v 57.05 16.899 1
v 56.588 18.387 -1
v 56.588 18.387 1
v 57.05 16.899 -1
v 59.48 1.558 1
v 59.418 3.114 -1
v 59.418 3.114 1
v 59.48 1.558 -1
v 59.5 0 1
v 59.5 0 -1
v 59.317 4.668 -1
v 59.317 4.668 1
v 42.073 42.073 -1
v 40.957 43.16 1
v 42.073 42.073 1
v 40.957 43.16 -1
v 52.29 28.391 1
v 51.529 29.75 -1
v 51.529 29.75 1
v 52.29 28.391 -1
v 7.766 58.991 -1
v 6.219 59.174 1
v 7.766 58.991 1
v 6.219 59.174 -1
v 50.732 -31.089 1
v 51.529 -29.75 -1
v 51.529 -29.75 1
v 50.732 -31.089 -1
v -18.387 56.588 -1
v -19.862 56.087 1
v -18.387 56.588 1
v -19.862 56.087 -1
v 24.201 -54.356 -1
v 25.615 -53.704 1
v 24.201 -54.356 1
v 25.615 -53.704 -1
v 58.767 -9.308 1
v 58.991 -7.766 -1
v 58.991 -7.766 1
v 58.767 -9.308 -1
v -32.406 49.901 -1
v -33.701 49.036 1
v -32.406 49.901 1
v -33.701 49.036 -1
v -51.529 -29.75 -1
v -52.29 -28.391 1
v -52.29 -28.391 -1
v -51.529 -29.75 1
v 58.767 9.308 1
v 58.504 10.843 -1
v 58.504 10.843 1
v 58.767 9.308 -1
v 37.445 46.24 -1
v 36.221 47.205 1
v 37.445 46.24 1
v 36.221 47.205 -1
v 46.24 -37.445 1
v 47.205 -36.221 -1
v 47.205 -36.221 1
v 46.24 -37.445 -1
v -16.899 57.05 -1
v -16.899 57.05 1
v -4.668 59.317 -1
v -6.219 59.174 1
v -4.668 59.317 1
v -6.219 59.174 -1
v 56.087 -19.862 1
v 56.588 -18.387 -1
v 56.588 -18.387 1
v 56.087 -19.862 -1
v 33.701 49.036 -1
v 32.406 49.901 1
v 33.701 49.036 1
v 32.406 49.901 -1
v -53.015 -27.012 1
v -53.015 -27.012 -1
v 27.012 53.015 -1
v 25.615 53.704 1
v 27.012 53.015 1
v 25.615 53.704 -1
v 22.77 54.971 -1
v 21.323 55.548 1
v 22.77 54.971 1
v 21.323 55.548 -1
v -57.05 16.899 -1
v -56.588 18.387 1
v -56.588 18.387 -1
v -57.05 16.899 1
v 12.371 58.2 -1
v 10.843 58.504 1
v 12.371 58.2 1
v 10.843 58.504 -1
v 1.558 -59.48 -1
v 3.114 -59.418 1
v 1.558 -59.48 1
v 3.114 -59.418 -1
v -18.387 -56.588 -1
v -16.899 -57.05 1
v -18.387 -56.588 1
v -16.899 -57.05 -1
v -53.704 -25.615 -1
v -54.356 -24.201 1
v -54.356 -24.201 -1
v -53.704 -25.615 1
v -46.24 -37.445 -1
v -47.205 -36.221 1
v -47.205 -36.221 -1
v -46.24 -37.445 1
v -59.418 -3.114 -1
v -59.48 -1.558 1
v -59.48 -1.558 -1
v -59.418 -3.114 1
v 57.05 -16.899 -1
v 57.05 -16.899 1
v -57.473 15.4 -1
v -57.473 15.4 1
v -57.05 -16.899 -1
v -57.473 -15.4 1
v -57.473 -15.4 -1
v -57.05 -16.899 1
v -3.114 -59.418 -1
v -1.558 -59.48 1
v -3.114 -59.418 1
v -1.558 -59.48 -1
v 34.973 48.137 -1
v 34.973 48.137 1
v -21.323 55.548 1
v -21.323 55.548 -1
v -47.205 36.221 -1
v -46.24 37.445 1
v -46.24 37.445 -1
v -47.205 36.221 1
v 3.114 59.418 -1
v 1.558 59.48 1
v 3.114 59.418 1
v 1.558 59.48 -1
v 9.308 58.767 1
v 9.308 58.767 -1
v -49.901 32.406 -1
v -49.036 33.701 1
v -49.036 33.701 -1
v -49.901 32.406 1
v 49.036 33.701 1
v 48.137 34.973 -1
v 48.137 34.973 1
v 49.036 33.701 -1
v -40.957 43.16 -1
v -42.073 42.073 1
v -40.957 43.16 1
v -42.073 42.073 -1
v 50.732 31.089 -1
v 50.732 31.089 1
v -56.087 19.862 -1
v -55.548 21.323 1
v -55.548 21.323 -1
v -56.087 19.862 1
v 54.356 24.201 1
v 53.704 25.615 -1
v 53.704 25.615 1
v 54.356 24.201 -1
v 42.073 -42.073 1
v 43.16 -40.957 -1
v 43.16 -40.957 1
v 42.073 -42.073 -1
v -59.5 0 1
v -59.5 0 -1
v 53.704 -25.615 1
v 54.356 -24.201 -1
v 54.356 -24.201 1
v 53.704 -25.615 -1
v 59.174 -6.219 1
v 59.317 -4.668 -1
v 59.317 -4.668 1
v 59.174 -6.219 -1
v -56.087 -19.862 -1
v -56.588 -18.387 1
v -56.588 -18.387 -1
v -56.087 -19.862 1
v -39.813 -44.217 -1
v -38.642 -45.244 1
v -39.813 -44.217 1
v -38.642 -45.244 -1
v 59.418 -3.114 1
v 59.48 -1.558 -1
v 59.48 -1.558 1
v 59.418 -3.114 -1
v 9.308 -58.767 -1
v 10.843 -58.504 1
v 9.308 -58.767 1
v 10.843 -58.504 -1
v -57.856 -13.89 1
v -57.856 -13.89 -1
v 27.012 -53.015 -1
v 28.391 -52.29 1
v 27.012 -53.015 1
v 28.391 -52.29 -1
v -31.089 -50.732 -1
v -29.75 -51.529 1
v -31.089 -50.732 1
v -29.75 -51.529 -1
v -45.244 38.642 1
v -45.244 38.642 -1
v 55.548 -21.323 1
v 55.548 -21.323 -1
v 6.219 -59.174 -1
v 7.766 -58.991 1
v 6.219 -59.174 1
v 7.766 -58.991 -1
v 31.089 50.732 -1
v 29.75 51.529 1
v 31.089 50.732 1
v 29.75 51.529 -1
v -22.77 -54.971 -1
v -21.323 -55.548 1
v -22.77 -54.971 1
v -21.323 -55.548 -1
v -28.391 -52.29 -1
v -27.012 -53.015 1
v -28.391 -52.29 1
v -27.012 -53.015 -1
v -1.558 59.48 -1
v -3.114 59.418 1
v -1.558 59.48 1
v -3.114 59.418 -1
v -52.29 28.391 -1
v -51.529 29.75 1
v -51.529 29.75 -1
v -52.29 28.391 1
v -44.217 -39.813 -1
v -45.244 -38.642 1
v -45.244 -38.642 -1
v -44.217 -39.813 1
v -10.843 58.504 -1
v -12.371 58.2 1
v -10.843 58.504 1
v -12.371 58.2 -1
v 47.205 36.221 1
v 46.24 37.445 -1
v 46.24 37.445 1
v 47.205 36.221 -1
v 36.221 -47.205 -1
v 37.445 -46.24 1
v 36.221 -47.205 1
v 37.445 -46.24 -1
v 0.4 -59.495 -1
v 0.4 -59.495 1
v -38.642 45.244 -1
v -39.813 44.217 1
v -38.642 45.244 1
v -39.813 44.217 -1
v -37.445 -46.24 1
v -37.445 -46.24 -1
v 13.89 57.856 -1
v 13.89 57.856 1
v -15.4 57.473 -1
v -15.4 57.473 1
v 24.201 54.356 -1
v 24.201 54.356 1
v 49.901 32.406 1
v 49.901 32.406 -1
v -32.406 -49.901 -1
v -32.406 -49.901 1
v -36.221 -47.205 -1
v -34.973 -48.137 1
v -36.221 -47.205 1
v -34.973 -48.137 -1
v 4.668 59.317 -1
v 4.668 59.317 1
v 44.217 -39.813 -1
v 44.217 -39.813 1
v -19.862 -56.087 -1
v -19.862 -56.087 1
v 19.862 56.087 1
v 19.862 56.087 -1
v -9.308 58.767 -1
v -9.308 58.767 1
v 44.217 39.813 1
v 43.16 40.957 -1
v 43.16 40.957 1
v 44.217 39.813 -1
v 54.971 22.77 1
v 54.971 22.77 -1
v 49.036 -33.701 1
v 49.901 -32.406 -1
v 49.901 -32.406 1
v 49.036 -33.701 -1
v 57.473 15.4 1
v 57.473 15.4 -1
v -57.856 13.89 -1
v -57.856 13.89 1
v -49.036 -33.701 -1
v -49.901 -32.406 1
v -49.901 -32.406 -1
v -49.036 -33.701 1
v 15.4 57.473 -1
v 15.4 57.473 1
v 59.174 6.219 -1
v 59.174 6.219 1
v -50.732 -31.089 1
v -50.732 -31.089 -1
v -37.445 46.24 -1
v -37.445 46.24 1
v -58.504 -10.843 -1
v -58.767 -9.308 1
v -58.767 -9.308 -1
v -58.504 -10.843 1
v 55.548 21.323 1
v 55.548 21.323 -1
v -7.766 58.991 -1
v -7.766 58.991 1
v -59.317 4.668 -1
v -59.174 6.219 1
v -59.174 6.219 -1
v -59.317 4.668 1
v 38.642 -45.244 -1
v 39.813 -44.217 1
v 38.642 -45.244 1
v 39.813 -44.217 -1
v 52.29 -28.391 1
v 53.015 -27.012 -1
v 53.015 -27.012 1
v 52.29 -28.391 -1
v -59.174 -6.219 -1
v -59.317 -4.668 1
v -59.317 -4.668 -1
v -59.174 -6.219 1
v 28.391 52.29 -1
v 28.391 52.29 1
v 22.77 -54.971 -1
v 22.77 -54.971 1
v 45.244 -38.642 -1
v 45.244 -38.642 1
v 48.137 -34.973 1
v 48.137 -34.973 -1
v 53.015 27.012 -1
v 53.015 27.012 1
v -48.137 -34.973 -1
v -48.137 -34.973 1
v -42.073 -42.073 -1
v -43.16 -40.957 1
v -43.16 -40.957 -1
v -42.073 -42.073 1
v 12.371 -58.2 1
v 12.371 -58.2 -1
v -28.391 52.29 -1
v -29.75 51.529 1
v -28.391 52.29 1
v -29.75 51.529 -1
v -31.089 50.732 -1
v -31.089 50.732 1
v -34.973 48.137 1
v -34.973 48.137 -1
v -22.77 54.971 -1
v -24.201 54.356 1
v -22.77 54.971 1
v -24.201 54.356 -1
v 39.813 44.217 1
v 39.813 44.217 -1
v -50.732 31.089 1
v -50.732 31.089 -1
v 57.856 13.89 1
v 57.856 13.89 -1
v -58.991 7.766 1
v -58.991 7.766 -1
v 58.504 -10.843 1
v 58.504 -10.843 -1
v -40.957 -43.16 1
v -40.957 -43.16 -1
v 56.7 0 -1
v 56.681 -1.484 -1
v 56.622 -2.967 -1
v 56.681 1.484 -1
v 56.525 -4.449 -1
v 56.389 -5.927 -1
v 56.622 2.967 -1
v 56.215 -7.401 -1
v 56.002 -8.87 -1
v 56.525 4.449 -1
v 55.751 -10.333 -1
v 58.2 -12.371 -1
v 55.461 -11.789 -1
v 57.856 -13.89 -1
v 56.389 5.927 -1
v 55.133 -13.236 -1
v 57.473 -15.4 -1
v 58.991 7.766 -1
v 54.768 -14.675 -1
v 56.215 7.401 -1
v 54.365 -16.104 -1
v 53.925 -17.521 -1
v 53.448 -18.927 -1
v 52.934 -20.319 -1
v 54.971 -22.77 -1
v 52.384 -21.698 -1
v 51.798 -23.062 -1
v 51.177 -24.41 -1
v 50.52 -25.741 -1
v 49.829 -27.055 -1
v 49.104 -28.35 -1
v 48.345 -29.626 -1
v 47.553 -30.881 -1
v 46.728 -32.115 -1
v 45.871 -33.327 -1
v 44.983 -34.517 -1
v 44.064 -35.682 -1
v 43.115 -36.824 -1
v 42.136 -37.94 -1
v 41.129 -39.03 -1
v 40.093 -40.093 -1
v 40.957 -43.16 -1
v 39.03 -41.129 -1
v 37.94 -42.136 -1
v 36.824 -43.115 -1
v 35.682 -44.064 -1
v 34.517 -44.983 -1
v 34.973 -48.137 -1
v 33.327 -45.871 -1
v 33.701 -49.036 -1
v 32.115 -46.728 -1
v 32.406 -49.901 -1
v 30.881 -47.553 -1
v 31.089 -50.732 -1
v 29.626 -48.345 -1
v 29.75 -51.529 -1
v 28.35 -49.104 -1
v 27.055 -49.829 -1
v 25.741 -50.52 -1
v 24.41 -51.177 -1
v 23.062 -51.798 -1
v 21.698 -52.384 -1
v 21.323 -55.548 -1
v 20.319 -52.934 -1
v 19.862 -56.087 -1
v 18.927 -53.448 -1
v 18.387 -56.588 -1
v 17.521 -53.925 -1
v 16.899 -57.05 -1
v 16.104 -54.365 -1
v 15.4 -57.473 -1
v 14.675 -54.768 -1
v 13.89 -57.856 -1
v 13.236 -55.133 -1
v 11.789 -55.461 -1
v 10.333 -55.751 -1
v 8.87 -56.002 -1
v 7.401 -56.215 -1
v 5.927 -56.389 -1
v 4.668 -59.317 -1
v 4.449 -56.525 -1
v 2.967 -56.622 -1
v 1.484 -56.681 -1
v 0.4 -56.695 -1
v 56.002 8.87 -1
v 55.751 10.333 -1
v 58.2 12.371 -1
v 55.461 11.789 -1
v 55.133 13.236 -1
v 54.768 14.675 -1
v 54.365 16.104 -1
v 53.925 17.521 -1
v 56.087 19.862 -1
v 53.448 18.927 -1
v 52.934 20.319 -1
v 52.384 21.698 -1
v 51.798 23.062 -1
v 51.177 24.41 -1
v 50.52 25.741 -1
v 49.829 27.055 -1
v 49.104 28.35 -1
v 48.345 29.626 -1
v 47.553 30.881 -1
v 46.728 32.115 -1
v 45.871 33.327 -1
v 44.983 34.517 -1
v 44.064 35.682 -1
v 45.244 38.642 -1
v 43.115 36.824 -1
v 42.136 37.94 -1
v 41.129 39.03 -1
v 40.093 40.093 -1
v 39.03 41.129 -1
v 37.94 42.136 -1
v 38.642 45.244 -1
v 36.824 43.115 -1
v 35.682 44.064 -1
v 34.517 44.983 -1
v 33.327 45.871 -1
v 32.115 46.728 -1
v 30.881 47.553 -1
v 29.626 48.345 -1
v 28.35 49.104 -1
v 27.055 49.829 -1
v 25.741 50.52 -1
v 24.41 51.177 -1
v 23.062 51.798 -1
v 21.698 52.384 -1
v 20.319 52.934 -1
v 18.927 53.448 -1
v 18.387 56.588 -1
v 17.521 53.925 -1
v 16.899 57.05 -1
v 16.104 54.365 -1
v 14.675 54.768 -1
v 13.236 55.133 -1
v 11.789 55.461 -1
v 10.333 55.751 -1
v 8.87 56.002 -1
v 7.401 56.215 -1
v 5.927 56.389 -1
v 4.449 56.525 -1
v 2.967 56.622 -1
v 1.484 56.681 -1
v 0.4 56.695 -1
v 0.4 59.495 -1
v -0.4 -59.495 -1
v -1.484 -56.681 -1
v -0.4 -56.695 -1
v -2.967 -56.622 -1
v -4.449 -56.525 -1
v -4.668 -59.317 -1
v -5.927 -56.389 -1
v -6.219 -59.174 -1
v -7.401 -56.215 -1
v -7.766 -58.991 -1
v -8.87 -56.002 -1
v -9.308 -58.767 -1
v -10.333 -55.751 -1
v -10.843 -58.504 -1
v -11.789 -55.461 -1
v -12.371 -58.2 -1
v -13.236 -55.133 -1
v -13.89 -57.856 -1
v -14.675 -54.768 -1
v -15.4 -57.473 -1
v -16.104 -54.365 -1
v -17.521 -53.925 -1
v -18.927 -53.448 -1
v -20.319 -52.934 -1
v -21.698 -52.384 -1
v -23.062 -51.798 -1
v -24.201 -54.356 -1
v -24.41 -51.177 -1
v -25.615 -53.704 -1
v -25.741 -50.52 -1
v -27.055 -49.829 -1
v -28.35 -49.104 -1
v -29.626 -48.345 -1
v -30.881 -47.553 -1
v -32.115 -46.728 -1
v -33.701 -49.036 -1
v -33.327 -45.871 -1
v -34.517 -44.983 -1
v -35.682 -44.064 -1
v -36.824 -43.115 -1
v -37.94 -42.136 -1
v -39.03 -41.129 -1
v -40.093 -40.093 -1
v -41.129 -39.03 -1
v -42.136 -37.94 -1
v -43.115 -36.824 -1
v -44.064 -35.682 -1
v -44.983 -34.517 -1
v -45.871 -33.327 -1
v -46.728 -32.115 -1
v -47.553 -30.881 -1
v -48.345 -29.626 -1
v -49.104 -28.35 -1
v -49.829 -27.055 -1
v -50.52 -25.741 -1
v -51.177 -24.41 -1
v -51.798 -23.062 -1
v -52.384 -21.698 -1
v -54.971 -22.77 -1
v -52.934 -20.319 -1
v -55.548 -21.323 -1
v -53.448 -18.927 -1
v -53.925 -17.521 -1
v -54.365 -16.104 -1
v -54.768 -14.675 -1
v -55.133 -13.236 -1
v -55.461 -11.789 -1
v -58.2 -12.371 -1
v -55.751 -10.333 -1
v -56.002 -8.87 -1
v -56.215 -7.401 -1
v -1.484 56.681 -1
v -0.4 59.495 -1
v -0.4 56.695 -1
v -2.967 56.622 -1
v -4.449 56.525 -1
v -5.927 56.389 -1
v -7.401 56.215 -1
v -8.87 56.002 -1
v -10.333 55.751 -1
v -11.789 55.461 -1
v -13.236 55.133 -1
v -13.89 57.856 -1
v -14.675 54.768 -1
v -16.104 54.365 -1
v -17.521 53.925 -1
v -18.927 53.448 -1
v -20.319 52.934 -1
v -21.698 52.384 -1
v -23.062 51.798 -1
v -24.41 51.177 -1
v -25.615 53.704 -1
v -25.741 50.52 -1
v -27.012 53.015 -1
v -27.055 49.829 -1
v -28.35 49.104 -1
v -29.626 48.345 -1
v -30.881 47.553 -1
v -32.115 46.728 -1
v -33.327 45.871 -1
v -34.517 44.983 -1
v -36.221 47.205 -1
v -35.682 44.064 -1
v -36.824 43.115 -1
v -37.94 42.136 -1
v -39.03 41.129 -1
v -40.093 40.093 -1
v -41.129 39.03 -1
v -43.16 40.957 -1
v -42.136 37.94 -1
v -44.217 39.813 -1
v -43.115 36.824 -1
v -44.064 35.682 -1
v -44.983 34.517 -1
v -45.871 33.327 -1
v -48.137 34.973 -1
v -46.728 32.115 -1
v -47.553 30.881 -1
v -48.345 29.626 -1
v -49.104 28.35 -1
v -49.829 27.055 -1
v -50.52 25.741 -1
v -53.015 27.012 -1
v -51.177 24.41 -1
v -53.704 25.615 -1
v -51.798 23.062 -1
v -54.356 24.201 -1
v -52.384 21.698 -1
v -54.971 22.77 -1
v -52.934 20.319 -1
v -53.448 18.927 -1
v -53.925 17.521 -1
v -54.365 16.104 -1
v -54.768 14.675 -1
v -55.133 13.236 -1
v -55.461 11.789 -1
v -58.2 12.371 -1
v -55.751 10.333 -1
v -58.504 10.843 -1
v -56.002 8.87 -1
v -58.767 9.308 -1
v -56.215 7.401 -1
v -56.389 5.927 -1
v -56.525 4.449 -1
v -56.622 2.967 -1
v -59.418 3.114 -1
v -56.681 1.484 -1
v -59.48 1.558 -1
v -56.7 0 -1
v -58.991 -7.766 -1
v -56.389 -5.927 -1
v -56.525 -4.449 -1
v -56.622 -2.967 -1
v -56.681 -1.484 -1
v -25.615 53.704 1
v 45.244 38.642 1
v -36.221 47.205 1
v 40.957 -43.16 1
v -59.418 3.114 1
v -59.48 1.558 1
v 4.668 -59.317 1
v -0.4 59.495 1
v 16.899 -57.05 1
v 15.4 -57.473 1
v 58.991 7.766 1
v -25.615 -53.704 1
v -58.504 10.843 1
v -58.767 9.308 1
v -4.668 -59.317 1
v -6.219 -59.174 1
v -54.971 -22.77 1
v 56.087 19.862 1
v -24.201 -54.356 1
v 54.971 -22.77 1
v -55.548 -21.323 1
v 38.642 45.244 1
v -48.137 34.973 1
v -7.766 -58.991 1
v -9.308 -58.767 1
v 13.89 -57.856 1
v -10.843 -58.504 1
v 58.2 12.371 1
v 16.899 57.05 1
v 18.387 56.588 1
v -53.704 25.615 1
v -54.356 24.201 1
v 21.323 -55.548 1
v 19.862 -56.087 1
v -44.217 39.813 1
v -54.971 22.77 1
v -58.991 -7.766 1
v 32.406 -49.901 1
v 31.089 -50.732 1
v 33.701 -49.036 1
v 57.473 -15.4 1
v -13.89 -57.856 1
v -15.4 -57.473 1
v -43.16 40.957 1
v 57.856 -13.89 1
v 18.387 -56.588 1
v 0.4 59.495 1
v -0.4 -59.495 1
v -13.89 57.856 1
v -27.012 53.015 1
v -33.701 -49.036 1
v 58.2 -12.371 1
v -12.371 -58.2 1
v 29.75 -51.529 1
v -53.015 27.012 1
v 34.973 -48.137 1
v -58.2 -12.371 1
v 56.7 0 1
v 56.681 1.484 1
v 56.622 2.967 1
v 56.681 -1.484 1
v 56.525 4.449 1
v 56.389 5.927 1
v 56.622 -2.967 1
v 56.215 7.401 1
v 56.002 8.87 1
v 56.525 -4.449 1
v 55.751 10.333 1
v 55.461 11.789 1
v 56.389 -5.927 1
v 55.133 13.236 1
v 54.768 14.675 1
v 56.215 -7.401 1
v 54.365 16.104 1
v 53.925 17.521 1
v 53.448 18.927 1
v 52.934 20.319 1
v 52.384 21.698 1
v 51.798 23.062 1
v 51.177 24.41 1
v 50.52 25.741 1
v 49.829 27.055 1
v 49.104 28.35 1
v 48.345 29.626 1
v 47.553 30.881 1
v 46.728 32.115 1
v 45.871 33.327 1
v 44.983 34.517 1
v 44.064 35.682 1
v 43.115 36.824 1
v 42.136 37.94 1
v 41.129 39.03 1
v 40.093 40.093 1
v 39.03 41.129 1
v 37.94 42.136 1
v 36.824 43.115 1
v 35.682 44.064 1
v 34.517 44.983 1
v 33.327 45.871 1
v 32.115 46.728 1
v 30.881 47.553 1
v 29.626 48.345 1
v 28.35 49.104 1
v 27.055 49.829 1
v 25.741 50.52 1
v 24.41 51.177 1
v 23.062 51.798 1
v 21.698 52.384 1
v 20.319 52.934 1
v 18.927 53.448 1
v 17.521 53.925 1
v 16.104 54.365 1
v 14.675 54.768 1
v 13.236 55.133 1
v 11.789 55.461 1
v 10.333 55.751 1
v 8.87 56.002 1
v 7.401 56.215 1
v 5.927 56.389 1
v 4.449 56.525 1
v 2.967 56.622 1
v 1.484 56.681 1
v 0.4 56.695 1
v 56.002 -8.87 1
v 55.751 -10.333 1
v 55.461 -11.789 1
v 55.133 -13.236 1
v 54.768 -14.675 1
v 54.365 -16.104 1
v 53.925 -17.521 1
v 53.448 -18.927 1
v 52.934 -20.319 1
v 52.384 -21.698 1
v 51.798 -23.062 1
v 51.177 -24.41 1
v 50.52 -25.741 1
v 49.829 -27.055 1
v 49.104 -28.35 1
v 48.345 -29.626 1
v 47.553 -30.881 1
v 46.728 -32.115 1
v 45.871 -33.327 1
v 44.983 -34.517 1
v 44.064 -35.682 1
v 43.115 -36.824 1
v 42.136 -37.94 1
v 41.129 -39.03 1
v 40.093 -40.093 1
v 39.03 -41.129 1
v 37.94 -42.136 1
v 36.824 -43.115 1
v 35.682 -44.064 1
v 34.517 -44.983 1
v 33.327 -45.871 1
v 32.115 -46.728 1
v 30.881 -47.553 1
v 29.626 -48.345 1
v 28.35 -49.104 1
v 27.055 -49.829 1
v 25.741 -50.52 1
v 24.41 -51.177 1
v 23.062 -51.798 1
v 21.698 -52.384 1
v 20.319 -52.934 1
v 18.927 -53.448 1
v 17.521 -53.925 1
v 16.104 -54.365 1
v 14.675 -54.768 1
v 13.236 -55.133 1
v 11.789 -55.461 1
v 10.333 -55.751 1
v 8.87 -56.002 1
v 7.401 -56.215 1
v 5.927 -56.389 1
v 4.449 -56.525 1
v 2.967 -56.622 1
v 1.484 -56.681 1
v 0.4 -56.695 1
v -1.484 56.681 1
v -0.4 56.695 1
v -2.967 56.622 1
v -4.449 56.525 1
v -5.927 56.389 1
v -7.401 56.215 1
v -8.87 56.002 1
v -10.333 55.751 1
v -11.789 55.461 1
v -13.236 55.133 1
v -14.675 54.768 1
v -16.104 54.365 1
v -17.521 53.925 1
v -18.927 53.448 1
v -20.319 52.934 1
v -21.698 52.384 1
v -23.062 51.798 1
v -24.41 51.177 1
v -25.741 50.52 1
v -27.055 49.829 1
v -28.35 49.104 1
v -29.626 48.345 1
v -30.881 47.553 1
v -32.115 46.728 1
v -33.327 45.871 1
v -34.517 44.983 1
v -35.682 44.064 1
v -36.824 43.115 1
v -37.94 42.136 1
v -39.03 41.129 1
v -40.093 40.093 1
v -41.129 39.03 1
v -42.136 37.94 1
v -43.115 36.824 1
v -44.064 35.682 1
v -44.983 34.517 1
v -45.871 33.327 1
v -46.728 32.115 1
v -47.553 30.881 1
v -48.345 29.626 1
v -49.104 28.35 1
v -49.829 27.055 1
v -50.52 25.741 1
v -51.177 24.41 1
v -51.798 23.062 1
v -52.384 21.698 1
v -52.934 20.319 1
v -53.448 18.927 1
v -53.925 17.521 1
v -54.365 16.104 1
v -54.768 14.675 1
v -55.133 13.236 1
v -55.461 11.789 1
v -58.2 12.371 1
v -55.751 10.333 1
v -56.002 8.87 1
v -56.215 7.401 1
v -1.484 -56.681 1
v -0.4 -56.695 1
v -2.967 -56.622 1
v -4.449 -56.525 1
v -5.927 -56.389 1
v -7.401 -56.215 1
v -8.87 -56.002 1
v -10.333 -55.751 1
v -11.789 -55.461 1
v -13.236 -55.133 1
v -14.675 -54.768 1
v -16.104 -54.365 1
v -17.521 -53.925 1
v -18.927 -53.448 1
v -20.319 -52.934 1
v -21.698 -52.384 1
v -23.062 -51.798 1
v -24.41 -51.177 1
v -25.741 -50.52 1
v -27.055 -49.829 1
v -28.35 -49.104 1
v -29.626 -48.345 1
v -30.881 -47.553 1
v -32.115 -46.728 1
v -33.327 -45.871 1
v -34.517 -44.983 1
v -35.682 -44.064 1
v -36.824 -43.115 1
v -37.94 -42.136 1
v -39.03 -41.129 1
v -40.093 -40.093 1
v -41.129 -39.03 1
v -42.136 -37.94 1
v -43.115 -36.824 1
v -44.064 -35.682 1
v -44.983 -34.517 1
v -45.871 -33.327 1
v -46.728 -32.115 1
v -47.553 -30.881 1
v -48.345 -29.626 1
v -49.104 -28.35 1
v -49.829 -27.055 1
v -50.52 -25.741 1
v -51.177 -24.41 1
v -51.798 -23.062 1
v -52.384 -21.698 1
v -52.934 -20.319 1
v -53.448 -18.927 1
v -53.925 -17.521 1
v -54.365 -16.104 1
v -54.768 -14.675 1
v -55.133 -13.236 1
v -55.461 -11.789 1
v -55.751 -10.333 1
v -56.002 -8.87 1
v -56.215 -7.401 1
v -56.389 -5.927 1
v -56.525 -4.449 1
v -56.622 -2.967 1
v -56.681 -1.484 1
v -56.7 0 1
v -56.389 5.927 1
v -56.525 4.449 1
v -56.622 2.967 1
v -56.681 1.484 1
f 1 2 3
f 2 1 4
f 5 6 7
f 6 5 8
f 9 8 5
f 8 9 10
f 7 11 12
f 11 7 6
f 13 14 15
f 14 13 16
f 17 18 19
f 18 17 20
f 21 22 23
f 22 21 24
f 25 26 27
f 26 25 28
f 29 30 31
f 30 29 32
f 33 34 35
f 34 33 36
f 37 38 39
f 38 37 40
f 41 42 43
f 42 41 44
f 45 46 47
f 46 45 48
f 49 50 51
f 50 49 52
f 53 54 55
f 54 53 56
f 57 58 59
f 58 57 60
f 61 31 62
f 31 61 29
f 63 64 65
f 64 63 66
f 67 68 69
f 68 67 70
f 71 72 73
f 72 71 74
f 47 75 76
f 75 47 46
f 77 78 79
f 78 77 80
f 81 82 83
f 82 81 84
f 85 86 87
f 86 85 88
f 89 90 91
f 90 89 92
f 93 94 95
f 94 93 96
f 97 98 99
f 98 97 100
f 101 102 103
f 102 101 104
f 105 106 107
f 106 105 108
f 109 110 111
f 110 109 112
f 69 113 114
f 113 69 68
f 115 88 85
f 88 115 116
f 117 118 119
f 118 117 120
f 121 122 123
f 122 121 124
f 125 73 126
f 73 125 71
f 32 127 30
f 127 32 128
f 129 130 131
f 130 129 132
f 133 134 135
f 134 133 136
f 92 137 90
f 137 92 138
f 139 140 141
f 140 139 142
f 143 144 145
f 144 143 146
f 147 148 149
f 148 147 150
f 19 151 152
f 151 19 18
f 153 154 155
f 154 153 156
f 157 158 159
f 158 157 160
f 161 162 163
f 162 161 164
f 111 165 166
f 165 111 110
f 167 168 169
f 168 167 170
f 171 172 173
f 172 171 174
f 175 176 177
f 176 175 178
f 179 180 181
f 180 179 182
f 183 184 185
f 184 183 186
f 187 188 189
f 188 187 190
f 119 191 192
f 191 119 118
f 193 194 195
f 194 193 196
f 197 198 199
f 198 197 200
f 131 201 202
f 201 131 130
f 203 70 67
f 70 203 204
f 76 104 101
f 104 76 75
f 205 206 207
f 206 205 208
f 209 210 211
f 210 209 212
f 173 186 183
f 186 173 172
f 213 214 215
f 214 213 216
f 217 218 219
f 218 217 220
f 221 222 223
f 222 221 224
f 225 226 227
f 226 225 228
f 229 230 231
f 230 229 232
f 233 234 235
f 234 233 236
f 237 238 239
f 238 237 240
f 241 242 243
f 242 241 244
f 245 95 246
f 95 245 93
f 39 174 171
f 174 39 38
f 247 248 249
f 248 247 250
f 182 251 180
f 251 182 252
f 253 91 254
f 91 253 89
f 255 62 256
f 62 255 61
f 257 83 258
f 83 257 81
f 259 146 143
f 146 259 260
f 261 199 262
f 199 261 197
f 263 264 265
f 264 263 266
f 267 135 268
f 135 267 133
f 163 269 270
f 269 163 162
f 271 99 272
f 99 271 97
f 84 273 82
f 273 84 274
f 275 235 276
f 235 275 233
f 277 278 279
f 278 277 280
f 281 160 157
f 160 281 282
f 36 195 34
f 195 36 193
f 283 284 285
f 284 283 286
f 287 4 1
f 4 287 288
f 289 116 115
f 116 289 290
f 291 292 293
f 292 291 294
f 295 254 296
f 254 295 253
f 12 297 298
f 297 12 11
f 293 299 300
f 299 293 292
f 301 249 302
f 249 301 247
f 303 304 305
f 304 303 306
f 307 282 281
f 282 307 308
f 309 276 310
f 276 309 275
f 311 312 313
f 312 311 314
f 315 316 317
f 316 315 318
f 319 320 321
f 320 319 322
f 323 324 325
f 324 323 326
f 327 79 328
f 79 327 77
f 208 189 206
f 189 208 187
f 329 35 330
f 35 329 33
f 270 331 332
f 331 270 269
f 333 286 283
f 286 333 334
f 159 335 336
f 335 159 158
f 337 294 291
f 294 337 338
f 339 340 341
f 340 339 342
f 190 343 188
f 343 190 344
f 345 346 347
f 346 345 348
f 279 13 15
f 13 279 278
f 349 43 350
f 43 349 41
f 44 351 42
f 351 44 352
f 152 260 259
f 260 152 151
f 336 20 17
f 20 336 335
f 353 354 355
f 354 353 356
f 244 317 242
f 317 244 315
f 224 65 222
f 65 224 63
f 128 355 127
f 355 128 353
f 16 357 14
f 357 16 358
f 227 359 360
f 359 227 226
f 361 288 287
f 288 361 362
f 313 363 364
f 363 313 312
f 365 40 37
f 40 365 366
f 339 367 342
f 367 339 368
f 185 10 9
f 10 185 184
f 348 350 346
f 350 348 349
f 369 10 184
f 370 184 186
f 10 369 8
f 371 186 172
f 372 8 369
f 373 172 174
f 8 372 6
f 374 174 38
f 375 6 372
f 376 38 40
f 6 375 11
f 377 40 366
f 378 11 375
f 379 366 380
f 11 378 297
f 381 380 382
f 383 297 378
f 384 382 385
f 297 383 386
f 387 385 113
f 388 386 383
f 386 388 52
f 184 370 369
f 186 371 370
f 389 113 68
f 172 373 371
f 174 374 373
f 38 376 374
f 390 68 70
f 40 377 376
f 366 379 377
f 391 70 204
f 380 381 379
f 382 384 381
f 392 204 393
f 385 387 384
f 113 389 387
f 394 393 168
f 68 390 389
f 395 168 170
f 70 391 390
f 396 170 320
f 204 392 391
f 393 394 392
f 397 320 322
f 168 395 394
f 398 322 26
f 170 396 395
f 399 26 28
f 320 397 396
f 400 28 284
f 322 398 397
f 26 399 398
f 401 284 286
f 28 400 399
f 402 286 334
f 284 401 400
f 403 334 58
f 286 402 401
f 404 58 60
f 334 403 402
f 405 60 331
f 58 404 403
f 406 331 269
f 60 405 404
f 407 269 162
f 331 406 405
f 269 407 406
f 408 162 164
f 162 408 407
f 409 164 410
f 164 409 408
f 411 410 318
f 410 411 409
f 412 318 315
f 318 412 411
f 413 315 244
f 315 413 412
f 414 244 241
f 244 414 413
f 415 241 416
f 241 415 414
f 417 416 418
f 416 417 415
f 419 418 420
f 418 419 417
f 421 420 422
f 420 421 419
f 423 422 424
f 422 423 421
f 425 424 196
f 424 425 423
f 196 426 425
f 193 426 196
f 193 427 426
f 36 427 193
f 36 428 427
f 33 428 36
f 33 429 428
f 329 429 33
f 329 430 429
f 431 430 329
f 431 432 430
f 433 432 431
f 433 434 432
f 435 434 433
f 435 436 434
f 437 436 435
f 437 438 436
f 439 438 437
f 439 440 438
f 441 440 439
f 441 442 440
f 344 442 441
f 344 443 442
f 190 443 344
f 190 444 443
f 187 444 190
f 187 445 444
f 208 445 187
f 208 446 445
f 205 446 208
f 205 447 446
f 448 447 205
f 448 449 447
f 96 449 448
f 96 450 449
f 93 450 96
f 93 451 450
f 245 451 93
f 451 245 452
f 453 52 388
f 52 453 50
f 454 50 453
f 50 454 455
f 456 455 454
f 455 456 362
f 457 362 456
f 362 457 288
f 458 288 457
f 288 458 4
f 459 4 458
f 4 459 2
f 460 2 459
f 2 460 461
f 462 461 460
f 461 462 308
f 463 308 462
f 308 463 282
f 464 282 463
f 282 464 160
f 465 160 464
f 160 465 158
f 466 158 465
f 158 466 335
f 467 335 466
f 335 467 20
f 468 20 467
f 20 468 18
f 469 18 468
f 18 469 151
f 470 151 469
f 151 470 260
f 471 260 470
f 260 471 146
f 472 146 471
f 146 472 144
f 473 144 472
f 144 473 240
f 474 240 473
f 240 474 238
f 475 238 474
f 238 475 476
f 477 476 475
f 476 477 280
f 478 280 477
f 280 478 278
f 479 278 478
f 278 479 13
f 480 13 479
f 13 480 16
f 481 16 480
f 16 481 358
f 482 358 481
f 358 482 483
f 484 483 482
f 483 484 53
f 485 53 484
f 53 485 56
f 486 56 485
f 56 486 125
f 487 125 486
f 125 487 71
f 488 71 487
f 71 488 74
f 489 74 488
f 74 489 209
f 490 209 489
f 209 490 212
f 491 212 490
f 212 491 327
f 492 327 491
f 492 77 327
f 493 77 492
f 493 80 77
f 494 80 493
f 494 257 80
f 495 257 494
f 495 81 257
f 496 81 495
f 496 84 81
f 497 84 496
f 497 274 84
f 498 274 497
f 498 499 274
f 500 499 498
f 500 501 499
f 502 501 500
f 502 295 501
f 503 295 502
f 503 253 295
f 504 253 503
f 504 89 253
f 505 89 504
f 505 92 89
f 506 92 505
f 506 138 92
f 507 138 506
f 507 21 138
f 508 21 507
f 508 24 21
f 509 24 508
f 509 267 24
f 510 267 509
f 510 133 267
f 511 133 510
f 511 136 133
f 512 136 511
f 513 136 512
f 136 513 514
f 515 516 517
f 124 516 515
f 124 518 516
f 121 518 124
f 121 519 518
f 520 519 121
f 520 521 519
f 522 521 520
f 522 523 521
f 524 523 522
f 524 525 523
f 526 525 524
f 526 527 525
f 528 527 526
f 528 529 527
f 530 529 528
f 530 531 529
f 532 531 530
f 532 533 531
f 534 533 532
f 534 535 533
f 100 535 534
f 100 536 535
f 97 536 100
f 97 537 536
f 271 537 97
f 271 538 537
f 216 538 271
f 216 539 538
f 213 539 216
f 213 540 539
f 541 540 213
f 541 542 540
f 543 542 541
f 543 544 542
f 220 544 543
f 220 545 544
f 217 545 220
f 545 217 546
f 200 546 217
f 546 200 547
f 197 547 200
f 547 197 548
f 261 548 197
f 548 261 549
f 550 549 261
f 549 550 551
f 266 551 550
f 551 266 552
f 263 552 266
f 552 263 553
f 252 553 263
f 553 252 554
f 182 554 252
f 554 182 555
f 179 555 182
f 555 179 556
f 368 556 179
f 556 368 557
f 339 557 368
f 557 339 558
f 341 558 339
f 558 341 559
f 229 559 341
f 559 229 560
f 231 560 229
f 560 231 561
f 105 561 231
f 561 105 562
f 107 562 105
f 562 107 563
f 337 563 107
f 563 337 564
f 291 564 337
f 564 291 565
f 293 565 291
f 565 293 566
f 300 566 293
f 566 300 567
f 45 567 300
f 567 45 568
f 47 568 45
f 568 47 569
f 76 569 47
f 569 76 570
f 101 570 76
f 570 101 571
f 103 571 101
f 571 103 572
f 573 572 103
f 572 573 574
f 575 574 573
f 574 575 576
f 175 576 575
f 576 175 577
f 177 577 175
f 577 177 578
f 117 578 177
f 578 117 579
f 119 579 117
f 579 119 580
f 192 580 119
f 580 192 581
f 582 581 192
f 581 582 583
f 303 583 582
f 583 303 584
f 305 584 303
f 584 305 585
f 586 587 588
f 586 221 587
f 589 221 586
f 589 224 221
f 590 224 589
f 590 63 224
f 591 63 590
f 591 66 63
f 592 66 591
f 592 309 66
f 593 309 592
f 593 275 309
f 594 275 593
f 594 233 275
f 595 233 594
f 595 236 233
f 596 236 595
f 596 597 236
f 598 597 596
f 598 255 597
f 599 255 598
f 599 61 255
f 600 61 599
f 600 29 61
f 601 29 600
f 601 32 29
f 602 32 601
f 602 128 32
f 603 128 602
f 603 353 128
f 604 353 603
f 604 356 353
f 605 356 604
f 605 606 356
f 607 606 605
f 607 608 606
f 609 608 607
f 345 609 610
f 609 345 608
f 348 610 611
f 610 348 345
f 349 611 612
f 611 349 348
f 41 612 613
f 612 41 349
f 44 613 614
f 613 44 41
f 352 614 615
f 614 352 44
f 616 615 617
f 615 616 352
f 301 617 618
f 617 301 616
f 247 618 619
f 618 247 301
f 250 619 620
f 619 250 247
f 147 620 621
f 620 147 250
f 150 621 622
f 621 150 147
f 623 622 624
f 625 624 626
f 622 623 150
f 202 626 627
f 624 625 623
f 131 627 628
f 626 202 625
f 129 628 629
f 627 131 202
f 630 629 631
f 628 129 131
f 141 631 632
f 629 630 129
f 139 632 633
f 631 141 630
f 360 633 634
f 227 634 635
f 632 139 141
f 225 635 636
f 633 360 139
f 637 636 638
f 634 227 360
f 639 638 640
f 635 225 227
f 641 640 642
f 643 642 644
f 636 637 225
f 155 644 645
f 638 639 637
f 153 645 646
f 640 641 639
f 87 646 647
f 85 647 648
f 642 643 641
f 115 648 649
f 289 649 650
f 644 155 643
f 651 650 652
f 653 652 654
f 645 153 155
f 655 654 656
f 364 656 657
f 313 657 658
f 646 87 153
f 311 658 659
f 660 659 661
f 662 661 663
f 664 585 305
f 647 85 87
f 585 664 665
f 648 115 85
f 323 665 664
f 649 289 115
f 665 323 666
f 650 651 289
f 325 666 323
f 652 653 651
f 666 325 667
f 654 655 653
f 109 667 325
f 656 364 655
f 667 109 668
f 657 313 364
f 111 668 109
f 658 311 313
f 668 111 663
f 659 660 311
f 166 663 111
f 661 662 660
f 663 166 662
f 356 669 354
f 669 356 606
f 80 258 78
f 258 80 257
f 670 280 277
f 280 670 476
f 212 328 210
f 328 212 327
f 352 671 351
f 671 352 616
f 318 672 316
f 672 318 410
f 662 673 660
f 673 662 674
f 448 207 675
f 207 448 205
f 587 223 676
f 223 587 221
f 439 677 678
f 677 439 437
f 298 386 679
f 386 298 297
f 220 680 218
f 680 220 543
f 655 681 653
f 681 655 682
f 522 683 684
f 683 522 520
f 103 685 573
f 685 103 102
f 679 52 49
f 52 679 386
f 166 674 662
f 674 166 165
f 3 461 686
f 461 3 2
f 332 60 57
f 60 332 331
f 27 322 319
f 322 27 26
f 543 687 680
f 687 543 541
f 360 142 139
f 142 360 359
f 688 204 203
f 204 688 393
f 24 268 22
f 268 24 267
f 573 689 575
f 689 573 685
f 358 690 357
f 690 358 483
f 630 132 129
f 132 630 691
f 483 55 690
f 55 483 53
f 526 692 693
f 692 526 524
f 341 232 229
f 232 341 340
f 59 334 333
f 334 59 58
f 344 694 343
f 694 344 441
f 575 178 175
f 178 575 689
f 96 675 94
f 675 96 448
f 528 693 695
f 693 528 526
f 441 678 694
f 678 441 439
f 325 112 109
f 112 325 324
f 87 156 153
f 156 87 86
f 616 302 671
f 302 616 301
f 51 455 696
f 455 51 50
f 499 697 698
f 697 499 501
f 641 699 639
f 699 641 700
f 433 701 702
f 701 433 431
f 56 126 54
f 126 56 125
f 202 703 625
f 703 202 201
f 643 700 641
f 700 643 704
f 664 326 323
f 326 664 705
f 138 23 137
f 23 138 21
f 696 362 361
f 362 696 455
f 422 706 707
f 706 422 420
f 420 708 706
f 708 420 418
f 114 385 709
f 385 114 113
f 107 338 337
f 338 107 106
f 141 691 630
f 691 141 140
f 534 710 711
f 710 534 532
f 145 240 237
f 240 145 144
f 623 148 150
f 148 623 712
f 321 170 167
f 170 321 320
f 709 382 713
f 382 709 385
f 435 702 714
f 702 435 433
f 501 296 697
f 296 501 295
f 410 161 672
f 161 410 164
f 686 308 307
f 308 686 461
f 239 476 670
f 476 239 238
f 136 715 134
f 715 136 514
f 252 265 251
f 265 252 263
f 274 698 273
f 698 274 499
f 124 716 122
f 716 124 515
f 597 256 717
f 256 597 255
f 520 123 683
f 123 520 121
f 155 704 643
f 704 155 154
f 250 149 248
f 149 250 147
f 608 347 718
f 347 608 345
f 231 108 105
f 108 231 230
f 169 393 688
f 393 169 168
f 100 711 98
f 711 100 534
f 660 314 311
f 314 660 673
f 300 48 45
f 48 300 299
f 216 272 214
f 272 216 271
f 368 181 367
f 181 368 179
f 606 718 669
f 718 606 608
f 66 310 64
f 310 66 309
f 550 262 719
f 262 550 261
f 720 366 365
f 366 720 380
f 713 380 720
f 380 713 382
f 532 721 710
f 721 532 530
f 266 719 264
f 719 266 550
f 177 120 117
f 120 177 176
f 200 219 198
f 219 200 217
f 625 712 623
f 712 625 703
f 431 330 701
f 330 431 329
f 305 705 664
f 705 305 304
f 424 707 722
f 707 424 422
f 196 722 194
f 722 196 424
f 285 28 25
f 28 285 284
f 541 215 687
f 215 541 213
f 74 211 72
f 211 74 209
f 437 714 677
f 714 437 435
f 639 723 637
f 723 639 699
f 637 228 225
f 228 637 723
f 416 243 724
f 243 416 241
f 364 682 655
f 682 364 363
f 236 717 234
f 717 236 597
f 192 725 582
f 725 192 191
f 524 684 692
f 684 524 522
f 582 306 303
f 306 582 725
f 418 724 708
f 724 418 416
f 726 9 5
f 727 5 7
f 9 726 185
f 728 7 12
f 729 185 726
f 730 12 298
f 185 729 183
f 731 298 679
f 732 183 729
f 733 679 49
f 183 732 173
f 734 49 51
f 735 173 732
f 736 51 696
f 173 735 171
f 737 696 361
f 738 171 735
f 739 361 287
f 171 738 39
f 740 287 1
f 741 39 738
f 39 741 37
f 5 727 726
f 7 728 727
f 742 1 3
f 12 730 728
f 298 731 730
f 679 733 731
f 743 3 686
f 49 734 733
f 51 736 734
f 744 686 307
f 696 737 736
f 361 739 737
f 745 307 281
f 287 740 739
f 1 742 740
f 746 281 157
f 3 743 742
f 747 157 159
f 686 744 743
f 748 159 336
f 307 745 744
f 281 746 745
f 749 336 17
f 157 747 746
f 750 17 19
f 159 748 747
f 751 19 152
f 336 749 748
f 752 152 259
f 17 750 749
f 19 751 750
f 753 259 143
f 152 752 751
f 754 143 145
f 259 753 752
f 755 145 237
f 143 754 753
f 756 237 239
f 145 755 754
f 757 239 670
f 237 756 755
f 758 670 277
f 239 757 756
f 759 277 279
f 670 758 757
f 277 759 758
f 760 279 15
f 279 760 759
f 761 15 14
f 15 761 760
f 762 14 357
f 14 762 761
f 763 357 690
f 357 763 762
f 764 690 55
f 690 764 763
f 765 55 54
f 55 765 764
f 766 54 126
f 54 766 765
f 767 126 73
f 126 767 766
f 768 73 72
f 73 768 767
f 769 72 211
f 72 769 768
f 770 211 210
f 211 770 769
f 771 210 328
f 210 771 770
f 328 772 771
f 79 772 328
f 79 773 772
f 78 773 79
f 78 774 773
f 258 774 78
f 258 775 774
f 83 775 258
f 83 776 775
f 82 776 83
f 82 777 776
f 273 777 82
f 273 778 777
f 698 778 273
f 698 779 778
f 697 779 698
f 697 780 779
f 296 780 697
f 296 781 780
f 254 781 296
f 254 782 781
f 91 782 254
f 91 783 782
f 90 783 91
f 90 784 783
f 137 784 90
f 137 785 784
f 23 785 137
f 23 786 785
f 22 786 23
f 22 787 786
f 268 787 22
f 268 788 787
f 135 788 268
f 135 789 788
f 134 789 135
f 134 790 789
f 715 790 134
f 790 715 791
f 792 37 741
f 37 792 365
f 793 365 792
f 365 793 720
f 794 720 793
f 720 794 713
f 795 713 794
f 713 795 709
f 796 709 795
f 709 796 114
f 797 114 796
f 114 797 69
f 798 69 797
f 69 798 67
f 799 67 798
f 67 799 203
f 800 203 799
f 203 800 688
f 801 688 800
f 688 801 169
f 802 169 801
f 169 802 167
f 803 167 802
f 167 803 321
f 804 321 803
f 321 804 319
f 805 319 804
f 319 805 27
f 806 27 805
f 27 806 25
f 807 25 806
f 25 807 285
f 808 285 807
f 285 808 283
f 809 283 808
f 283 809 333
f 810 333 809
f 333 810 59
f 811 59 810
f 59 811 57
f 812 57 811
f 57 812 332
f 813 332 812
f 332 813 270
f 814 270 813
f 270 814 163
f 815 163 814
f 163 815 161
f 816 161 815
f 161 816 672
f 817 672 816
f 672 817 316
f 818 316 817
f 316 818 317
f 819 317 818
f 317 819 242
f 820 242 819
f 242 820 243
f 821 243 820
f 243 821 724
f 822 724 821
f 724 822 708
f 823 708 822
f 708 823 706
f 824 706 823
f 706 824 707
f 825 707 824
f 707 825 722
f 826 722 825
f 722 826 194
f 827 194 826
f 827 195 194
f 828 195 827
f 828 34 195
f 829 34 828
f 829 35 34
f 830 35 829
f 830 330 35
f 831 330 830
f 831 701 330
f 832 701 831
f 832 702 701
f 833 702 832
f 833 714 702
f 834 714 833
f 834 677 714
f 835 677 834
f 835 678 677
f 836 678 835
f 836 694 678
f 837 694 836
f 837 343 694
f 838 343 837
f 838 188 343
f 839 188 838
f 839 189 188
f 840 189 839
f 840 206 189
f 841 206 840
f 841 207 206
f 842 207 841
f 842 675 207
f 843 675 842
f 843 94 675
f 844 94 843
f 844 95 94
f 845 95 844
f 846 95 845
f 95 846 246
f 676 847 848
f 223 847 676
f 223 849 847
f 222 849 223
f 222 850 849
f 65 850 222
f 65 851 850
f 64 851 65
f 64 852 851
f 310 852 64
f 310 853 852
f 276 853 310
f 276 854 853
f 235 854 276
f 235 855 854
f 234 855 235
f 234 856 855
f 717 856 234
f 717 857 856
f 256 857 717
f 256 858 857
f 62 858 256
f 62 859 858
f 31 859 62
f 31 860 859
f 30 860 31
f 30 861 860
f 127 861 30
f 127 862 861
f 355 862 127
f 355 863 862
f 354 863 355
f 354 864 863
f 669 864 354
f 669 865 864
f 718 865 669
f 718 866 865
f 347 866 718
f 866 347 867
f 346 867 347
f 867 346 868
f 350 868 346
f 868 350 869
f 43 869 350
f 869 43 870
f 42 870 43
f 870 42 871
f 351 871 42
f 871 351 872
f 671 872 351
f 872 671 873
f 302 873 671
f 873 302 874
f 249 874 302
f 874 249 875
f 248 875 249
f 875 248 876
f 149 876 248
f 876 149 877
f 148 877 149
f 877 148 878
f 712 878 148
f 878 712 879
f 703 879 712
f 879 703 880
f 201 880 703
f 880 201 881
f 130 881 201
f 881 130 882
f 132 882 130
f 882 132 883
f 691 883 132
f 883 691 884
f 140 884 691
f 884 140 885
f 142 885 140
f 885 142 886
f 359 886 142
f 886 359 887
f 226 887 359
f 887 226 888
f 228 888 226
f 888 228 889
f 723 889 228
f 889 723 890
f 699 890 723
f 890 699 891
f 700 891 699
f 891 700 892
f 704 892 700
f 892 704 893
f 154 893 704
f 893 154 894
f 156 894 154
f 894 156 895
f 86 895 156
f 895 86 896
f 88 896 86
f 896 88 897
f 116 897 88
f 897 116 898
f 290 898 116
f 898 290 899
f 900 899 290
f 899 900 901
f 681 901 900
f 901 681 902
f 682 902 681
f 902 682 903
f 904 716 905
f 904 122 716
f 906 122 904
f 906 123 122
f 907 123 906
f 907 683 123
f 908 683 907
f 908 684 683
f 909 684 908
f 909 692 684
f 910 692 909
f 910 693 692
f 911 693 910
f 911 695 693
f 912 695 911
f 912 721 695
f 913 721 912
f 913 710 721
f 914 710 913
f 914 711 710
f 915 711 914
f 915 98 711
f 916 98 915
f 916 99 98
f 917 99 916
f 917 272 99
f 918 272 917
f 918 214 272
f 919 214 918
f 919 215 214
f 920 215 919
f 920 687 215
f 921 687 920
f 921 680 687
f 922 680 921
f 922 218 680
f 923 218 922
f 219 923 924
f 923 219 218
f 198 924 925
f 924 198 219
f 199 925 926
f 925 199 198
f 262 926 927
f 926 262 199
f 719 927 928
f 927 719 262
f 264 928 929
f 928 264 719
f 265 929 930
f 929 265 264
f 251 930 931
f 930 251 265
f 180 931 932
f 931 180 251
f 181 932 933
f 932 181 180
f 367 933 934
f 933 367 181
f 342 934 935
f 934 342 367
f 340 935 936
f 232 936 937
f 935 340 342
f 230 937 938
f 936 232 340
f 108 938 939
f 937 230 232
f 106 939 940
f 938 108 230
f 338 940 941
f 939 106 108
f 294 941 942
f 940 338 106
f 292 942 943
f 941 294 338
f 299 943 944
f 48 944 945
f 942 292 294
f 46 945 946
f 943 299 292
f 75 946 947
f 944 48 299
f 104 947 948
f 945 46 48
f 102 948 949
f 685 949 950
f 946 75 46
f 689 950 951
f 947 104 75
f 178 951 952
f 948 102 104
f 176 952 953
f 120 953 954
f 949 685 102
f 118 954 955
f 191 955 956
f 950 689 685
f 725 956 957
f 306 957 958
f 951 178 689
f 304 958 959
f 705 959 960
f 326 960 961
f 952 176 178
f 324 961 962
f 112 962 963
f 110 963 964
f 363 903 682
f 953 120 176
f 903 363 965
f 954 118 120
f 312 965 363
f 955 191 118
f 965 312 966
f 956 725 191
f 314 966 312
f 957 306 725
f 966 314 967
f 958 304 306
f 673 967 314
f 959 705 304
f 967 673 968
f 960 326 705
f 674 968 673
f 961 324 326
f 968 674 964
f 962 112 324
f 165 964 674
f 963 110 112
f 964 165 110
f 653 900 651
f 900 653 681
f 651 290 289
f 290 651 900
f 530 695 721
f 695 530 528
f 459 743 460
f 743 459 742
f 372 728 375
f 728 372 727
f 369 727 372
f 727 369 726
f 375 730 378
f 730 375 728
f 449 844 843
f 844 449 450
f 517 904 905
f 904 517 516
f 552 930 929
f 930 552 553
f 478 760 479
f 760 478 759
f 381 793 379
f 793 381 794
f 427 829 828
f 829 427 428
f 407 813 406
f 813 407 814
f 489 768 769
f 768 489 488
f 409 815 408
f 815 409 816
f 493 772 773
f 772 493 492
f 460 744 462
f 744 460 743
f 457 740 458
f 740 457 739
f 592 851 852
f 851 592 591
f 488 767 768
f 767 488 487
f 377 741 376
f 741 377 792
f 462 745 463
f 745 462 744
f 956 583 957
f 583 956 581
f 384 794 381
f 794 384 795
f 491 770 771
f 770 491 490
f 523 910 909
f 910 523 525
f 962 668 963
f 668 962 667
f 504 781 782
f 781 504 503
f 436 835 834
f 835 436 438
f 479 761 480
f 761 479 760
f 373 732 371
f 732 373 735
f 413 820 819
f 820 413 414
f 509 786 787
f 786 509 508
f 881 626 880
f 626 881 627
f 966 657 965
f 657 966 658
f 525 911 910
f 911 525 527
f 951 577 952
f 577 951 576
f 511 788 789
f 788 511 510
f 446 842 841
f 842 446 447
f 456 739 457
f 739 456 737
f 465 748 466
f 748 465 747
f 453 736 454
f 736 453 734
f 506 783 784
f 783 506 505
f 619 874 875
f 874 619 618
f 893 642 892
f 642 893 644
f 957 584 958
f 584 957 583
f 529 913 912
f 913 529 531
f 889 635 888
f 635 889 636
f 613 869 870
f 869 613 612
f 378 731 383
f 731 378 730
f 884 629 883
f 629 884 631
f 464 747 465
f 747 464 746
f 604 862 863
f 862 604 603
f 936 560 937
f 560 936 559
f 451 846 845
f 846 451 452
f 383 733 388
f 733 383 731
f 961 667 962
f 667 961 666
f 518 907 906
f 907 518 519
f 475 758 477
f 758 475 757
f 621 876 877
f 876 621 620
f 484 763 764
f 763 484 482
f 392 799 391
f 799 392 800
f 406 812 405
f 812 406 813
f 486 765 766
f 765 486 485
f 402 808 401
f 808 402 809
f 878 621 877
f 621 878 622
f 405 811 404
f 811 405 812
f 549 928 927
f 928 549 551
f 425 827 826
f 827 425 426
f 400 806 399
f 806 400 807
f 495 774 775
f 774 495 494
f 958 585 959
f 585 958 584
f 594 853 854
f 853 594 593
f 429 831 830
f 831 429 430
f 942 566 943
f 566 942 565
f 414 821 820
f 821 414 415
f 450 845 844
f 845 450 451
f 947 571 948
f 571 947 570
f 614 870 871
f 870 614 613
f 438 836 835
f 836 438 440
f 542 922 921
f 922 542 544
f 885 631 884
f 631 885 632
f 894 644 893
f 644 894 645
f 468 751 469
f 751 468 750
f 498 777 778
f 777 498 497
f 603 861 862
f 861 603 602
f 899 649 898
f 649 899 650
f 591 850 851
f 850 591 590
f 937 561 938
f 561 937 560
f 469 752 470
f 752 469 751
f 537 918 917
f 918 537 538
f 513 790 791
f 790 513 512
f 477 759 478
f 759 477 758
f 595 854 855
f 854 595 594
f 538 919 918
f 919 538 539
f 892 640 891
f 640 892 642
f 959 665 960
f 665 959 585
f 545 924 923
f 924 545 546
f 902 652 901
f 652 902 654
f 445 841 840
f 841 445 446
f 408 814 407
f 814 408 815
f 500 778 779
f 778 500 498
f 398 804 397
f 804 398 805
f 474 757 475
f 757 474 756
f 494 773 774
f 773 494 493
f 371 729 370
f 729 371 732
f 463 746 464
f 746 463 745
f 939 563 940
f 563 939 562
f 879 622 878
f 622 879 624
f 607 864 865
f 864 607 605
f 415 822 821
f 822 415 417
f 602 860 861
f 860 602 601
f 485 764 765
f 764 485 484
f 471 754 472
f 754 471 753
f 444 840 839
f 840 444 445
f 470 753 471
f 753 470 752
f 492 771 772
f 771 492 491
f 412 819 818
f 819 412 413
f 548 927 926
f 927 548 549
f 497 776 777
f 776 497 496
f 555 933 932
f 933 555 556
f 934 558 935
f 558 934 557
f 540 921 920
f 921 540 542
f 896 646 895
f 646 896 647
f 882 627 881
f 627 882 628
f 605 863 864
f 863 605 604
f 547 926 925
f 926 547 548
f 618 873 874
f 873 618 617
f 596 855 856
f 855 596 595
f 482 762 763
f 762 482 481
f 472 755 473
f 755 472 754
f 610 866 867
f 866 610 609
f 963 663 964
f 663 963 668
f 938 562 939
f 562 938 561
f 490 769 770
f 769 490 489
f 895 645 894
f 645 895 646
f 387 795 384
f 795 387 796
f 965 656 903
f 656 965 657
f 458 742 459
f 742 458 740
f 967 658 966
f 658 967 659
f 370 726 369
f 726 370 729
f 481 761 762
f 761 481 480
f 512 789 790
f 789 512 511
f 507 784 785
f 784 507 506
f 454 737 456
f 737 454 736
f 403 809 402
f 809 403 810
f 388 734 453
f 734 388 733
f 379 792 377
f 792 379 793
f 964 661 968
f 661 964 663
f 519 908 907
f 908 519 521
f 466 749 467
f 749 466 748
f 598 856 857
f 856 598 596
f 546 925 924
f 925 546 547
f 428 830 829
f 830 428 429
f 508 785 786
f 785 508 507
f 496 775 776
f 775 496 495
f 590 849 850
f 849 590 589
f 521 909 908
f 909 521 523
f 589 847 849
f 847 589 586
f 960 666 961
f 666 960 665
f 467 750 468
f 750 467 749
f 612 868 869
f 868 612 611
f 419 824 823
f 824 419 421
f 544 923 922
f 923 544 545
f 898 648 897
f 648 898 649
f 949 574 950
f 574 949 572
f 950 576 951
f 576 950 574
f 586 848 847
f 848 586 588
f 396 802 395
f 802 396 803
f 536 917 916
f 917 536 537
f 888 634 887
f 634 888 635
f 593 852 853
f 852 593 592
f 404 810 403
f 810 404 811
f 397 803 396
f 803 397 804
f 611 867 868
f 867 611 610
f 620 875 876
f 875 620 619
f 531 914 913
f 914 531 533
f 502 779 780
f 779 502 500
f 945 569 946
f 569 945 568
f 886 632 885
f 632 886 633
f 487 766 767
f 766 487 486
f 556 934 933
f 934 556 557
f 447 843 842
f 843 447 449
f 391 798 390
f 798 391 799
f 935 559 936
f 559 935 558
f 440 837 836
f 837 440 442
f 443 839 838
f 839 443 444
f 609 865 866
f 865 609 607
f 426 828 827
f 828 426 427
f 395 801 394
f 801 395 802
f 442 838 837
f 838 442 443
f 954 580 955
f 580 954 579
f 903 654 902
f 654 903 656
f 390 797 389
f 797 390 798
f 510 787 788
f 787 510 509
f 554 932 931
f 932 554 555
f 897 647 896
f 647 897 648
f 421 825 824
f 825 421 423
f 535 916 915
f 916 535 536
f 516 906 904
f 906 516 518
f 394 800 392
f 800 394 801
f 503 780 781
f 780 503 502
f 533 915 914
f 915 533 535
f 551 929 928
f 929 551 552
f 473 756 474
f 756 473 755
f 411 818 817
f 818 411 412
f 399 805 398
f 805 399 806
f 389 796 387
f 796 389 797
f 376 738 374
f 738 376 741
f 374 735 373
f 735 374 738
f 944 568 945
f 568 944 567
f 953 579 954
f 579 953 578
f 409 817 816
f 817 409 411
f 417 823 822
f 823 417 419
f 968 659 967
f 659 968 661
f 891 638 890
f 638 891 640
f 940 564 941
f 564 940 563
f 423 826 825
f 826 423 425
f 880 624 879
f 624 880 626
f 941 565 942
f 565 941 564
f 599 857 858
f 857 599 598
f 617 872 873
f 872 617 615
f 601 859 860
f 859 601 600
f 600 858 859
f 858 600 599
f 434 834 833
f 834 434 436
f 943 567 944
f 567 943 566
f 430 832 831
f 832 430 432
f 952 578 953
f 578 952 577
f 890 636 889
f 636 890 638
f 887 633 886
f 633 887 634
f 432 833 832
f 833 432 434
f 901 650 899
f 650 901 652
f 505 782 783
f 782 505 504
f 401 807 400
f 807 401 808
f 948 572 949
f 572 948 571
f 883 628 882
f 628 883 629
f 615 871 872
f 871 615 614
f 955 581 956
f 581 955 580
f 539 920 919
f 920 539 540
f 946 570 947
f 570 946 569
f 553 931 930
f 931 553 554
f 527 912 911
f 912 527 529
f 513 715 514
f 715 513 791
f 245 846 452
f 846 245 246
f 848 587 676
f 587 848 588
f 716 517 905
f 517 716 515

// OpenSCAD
// FG-D01 v0.2 — split bezel geometry / assembly envelope
// Units: mm. Study only; NOT manufacturing or order release.
// This is an aesthetic bezel, not a load-bearing glass clamp.
$fn=240;
outer_d=119.0;
inner_d=113.4;
thickness=2.0;
split_gap=0.8;
module bezel_half(side=1) {
  assert(side==1 || side==-1);
  assert(outer_d>inner_d && split_gap>=0);
  // Clip the right half at x>=gap/2 and the left at x<=-gap/2.
  intersection() {
    difference() {
      cylinder(d=outer_d,h=thickness,center=true);
      cylinder(d=inner_d,h=thickness+0.4,center=true);
    }
    translate([side*(outer_d/2+split_gap/2),0,0])
      cube([outer_d,outer_d+2,thickness+1],center=true);
  }
}
color([0.65,0.48,0.25]) bezel_half(1);
color([0.65,0.48,0.25]) bezel_half(-1);
// Design hold: fasteners, mounting tabs, guard interface and z-offset are not yet specified.
// Do not export this study as manufacturing-ready STL/STEP.
